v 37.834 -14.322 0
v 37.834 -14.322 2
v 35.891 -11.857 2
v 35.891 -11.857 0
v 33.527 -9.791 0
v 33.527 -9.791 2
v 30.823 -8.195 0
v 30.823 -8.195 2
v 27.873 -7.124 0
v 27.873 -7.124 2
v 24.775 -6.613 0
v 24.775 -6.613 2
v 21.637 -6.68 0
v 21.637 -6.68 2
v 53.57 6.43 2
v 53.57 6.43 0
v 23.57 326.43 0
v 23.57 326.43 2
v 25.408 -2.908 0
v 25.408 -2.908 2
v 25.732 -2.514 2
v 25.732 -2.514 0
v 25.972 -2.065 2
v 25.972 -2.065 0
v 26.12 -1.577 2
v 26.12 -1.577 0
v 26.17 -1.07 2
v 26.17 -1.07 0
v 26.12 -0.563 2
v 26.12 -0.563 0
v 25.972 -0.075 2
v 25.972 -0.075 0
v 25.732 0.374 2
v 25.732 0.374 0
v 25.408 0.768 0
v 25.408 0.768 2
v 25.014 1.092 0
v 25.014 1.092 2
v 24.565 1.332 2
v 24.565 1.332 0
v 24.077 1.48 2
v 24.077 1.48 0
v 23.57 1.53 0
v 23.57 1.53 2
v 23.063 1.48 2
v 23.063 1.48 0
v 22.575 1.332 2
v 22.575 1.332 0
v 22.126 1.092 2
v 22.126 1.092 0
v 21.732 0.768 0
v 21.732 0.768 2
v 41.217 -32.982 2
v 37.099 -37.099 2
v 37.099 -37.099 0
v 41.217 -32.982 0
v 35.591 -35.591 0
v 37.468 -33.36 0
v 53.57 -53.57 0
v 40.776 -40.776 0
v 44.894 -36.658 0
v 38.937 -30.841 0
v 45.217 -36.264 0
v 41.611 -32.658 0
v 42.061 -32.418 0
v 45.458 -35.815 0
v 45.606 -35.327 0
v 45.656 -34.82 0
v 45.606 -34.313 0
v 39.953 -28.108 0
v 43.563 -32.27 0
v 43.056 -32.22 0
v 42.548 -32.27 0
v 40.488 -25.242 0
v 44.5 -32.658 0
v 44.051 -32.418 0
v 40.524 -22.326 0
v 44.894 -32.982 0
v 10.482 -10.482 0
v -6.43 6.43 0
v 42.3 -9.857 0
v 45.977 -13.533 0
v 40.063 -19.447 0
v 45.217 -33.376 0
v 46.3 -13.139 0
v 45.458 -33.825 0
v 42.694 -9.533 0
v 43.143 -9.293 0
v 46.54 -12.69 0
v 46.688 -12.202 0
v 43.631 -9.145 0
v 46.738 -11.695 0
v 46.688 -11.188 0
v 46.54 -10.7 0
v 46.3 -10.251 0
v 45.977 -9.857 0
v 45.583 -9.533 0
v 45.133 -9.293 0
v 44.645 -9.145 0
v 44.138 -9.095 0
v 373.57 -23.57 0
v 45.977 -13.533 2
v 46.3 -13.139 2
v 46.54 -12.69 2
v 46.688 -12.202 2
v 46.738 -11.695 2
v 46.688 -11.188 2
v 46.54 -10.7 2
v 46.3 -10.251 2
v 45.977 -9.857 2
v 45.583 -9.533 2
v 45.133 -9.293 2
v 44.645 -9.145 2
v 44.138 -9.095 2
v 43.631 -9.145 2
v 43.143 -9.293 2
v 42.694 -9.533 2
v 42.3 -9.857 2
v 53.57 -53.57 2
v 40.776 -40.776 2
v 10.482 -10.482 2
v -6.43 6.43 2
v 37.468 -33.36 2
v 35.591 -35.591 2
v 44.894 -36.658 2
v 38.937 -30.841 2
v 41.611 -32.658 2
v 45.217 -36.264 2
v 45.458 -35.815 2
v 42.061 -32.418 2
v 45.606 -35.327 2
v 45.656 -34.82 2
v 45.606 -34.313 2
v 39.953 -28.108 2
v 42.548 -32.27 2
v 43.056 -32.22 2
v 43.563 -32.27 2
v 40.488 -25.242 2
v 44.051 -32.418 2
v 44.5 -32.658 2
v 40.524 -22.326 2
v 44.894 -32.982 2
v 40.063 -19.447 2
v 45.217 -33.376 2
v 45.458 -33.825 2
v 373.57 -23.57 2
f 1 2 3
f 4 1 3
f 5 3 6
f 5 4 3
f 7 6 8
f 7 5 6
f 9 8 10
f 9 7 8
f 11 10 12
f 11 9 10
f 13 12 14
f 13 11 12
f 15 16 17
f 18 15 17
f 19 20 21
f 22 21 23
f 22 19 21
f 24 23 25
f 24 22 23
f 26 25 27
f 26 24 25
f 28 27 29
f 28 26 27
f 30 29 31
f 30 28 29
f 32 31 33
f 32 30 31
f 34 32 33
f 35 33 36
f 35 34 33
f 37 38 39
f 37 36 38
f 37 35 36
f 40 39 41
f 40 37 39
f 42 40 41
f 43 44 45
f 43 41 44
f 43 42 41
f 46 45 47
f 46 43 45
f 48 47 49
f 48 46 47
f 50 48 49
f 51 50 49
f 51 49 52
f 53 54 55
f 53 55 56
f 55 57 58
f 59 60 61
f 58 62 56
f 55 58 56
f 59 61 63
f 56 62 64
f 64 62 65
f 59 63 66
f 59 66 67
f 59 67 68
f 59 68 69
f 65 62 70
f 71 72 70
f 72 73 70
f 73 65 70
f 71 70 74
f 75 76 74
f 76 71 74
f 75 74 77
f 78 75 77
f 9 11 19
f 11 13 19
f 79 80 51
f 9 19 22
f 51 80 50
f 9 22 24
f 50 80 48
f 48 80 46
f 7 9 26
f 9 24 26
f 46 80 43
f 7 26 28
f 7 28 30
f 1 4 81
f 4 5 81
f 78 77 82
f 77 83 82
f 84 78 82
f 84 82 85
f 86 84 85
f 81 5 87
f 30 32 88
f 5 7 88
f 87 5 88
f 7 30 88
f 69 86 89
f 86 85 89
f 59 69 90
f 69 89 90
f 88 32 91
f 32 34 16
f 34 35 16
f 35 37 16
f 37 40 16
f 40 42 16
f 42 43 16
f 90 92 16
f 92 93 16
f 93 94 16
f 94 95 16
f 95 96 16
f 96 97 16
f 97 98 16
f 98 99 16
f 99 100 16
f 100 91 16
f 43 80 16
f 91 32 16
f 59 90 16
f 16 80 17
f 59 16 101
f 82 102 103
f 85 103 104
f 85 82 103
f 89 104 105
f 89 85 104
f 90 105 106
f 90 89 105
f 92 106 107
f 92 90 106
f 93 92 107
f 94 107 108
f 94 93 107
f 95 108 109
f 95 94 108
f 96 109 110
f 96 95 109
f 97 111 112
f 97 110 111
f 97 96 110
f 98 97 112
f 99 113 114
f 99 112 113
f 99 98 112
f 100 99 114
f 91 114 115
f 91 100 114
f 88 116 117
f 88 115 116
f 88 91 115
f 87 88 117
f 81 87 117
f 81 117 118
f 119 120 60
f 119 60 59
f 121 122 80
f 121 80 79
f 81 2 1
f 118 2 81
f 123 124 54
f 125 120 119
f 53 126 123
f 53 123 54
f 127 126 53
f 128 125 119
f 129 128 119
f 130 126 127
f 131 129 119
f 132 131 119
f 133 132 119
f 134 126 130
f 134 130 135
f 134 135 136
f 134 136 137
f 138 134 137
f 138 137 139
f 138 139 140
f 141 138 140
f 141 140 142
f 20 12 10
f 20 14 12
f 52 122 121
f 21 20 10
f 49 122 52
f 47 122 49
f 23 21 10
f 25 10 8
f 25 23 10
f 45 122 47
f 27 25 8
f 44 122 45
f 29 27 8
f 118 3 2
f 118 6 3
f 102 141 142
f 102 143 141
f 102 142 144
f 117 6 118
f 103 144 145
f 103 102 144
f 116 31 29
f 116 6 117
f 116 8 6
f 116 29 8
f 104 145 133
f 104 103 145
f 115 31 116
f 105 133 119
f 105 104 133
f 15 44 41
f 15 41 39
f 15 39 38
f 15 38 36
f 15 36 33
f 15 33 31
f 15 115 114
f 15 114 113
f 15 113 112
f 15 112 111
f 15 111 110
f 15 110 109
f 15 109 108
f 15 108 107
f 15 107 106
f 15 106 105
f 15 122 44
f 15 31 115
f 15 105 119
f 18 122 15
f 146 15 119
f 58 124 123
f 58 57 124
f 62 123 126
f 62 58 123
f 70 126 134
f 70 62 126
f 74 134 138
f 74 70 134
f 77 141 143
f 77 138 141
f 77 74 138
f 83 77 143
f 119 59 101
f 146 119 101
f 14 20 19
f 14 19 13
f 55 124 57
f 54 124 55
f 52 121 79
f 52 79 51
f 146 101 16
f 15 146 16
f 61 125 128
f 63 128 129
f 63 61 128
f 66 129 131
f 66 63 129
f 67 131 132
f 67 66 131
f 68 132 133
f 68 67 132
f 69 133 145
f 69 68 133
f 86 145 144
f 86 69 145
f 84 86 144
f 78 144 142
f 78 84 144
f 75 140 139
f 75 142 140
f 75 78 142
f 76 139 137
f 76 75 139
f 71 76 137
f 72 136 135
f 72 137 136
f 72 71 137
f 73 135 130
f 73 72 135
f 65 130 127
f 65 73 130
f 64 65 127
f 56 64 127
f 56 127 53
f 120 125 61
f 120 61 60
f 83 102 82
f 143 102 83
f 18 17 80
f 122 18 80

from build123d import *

# Parameters (mm, degrees)
SKETCH_1_R          = 2.6
SKETCH_1_R_2        = 17
EXTRUDE_1_DEPTH     = 2
CUT_EXTRUDE_2_DEPTH = 2


with BuildPart() as part:
    # 草图1 → 凸台-拉伸1 (new body)
    with BuildSketch(Plane.XY):
        Polygon((53.57, -53.57), (373.57, -23.57), (53.57, 6.43), (23.57, 326.43), (-6.43, 6.43), (-6.43, -53.57), align=None)
        with Locations((23.57, -47.32)):
            Circle(SKETCH_1_R, mode=Mode.SUBTRACT)
        with Locations((3.00189666, -11.695)):
            Circle(SKETCH_1_R, mode=Mode.SUBTRACT)
        with Locations((44.13810334, -11.695)):
            Circle(SKETCH_1_R, mode=Mode.SUBTRACT)
        with Locations((43.055571585, -34.82)):
            Circle(SKETCH_1_R, mode=Mode.SUBTRACT)
        with Locations((4.084428415, -34.82)):
            Circle(SKETCH_1_R, mode=Mode.SUBTRACT)
        with Locations((23.57, -1.07)):
            Circle(SKETCH_1_R, mode=Mode.SUBTRACT)
        with Locations((23.57, -23.57)):
            Circle(SKETCH_1_R_2, mode=Mode.SUBTRACT)
    extrude(amount=EXTRUDE_1_DEPTH)

    # 草图2 → 切除-拉伸2 (cut)
    with BuildSketch(Plane.XY.offset(2)):
        Polygon((53.57, -53.57), (-6.43, -53.57), (-6.43, 6.43), (10.481522369, -10.481522369), (21.731522369, 0.768477631), (25.408477631, -2.908477631), (14.158477631, -14.158477631), (26.078074039, -26.078074039), (42.299625709, -9.856522369), (45.976580971, -13.533477631), (29.755029301, -29.755029301), (37.099308161, -37.099308161), (41.217093954, -32.981522369), (44.894049216, -36.658477631), (40.776263424, -40.776263424), align=None)
    extrude(amount=-CUT_EXTRUDE_2_DEPTH, mode=Mode.SUBTRACT)


solid = part.part
